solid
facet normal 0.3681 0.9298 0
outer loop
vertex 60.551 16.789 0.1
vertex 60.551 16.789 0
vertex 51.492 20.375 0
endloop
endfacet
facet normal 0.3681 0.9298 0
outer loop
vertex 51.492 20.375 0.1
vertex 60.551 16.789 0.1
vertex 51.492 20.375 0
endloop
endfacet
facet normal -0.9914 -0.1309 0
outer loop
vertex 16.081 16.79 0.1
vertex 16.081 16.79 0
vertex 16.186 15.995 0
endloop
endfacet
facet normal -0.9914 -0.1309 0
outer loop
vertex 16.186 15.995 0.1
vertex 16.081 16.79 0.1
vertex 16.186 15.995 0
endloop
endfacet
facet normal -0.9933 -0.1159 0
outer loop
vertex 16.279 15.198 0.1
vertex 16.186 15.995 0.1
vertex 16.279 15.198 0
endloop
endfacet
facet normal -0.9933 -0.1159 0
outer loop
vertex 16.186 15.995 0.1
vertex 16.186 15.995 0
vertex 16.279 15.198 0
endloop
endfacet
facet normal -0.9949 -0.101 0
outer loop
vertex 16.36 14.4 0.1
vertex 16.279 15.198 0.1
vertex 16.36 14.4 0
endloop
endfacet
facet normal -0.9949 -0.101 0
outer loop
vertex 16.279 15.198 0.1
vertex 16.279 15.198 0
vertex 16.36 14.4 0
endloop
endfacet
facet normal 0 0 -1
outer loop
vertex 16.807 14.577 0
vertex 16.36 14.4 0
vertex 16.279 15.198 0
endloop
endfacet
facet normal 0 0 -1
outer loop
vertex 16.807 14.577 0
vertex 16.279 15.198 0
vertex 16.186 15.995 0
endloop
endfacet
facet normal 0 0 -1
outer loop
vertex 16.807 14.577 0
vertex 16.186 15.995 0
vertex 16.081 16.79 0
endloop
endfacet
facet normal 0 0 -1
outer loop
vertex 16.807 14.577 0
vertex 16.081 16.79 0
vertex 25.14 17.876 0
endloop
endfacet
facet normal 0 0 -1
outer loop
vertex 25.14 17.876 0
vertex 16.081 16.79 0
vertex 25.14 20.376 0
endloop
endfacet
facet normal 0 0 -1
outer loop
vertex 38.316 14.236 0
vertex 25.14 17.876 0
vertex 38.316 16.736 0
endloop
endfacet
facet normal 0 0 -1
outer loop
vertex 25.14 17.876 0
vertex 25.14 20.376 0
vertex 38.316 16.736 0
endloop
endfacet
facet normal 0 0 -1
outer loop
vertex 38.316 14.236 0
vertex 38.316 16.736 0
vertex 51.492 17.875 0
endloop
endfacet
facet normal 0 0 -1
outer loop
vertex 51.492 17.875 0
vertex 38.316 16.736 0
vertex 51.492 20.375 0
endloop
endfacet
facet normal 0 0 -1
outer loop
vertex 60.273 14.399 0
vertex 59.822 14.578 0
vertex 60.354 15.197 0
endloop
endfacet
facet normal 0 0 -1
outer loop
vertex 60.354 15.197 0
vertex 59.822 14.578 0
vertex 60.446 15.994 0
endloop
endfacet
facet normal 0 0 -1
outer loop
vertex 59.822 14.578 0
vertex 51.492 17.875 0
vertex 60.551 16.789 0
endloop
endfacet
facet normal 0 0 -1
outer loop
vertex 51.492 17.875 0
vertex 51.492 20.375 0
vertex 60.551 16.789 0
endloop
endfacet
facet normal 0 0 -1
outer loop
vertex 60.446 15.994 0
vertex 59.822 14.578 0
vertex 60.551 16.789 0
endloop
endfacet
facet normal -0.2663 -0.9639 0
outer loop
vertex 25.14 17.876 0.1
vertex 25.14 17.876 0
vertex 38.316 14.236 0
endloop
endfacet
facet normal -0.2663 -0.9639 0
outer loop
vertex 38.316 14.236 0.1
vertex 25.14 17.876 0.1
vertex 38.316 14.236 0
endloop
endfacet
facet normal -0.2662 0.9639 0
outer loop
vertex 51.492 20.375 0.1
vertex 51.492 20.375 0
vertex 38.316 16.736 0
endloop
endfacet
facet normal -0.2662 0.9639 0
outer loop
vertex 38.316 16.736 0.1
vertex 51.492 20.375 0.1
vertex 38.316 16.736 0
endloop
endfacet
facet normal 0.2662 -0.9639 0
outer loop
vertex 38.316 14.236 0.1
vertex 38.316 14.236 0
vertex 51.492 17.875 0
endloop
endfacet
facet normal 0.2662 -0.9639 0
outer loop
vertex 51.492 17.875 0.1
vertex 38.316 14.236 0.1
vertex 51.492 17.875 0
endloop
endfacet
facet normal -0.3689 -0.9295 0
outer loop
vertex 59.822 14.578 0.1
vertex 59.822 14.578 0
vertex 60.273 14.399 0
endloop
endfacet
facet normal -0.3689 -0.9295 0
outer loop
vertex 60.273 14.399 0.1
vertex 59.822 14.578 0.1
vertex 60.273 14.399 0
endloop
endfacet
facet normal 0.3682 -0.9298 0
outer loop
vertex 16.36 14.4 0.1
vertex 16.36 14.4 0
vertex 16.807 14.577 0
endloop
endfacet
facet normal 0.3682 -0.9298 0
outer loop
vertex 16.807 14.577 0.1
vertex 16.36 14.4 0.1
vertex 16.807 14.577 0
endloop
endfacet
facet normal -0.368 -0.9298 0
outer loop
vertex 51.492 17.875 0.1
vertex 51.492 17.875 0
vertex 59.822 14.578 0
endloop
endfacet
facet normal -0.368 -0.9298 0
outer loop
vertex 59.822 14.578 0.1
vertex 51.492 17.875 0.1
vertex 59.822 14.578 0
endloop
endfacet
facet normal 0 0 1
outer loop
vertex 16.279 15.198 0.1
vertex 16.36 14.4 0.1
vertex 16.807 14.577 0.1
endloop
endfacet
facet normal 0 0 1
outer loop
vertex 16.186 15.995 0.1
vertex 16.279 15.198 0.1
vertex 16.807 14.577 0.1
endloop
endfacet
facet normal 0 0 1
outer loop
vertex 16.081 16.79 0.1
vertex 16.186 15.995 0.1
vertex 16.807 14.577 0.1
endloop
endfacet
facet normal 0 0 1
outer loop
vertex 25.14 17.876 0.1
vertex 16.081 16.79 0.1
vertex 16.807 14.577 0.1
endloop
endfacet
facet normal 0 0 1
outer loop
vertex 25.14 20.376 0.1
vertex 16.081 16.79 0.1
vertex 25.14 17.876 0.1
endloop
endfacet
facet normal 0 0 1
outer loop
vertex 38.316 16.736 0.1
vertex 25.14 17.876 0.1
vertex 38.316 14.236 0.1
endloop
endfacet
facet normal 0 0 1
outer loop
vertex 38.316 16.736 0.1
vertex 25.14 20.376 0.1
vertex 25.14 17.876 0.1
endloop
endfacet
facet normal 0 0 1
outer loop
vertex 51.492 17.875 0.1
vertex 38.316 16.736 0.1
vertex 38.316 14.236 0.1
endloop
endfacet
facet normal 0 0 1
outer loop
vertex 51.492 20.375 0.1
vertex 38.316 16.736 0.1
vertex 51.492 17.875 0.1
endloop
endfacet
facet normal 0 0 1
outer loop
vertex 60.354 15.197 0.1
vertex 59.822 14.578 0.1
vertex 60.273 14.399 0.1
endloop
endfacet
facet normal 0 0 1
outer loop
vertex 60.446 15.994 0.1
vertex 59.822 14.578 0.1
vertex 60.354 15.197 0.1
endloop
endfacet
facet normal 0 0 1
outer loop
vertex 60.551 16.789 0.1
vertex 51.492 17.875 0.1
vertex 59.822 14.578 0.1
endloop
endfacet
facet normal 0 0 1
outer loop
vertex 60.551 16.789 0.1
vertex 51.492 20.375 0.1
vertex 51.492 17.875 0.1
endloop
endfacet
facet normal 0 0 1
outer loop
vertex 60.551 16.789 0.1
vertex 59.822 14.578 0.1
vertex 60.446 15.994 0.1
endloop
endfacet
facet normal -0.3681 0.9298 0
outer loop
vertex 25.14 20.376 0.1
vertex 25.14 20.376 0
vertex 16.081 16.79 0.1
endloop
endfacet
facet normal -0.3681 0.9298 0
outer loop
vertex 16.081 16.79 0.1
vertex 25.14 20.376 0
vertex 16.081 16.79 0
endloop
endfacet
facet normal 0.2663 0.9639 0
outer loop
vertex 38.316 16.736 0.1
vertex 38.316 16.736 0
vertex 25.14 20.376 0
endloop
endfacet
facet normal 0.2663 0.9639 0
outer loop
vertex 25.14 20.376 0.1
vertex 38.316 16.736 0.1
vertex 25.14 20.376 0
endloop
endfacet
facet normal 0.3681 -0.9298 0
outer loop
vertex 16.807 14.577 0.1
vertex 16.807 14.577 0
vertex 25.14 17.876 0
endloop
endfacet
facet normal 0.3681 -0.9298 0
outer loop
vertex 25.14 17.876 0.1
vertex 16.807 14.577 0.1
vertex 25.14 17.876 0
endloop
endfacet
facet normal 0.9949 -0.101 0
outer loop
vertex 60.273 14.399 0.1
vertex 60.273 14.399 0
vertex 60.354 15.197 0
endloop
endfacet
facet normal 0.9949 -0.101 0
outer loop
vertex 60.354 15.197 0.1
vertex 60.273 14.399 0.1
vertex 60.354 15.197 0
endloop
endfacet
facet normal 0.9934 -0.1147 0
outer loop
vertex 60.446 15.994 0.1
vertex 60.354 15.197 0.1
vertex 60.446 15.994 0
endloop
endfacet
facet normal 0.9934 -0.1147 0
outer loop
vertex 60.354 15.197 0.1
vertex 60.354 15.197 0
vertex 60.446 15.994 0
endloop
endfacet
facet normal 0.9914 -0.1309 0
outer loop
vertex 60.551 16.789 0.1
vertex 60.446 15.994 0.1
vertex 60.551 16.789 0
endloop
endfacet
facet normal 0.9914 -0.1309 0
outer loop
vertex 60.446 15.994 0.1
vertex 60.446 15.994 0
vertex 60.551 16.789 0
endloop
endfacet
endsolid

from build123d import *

# Parameters (mm, degrees)
SALIENTE_EXTRUIR1_DEPTH = 0.1


with BuildPart() as part:
    # Model → Saliente-Extruir1 (new body)
    with BuildSketch(Plane.XY):
        with BuildLine():
            Line((59.821558845, 14.577954318), (60.272695606, 14.399362661))
            ThreePointArc((60.272695606, 14.399362661), (60.398521137, 15.595766769), (60.551460532, 16.789007899))
            Line((60.551460532, 16.789007899), (51.49198027, 20.375387298))
            Line((51.49198027, 20.375387298), (38.316142065, 16.736158757))
            Line((38.316142065, 16.736158757), (25.140426213, 20.375830252))
            Line((25.140426213, 20.375830252), (16.080825387, 16.789755425))
            ThreePointArc((16.080825387, 16.789755425), (16.233724667, 15.596509154), (16.359509975, 14.400100817))
            Line((16.359509975, 14.400100817), (16.807003209, 14.577232707))
            Line((16.807003209, 14.577232707), (25.140342166, 17.875830254))
            Line((25.140342166, 17.875830254), (38.316058018, 14.236158759))
            Line((38.316058018, 14.236158759), (51.49198027, 17.875387298))
            Line((51.49198027, 17.875387298), (59.821558845, 14.577954318))
        make_face()
    extrude(amount=SALIENTE_EXTRUIR1_DEPTH)


solid = part.part
